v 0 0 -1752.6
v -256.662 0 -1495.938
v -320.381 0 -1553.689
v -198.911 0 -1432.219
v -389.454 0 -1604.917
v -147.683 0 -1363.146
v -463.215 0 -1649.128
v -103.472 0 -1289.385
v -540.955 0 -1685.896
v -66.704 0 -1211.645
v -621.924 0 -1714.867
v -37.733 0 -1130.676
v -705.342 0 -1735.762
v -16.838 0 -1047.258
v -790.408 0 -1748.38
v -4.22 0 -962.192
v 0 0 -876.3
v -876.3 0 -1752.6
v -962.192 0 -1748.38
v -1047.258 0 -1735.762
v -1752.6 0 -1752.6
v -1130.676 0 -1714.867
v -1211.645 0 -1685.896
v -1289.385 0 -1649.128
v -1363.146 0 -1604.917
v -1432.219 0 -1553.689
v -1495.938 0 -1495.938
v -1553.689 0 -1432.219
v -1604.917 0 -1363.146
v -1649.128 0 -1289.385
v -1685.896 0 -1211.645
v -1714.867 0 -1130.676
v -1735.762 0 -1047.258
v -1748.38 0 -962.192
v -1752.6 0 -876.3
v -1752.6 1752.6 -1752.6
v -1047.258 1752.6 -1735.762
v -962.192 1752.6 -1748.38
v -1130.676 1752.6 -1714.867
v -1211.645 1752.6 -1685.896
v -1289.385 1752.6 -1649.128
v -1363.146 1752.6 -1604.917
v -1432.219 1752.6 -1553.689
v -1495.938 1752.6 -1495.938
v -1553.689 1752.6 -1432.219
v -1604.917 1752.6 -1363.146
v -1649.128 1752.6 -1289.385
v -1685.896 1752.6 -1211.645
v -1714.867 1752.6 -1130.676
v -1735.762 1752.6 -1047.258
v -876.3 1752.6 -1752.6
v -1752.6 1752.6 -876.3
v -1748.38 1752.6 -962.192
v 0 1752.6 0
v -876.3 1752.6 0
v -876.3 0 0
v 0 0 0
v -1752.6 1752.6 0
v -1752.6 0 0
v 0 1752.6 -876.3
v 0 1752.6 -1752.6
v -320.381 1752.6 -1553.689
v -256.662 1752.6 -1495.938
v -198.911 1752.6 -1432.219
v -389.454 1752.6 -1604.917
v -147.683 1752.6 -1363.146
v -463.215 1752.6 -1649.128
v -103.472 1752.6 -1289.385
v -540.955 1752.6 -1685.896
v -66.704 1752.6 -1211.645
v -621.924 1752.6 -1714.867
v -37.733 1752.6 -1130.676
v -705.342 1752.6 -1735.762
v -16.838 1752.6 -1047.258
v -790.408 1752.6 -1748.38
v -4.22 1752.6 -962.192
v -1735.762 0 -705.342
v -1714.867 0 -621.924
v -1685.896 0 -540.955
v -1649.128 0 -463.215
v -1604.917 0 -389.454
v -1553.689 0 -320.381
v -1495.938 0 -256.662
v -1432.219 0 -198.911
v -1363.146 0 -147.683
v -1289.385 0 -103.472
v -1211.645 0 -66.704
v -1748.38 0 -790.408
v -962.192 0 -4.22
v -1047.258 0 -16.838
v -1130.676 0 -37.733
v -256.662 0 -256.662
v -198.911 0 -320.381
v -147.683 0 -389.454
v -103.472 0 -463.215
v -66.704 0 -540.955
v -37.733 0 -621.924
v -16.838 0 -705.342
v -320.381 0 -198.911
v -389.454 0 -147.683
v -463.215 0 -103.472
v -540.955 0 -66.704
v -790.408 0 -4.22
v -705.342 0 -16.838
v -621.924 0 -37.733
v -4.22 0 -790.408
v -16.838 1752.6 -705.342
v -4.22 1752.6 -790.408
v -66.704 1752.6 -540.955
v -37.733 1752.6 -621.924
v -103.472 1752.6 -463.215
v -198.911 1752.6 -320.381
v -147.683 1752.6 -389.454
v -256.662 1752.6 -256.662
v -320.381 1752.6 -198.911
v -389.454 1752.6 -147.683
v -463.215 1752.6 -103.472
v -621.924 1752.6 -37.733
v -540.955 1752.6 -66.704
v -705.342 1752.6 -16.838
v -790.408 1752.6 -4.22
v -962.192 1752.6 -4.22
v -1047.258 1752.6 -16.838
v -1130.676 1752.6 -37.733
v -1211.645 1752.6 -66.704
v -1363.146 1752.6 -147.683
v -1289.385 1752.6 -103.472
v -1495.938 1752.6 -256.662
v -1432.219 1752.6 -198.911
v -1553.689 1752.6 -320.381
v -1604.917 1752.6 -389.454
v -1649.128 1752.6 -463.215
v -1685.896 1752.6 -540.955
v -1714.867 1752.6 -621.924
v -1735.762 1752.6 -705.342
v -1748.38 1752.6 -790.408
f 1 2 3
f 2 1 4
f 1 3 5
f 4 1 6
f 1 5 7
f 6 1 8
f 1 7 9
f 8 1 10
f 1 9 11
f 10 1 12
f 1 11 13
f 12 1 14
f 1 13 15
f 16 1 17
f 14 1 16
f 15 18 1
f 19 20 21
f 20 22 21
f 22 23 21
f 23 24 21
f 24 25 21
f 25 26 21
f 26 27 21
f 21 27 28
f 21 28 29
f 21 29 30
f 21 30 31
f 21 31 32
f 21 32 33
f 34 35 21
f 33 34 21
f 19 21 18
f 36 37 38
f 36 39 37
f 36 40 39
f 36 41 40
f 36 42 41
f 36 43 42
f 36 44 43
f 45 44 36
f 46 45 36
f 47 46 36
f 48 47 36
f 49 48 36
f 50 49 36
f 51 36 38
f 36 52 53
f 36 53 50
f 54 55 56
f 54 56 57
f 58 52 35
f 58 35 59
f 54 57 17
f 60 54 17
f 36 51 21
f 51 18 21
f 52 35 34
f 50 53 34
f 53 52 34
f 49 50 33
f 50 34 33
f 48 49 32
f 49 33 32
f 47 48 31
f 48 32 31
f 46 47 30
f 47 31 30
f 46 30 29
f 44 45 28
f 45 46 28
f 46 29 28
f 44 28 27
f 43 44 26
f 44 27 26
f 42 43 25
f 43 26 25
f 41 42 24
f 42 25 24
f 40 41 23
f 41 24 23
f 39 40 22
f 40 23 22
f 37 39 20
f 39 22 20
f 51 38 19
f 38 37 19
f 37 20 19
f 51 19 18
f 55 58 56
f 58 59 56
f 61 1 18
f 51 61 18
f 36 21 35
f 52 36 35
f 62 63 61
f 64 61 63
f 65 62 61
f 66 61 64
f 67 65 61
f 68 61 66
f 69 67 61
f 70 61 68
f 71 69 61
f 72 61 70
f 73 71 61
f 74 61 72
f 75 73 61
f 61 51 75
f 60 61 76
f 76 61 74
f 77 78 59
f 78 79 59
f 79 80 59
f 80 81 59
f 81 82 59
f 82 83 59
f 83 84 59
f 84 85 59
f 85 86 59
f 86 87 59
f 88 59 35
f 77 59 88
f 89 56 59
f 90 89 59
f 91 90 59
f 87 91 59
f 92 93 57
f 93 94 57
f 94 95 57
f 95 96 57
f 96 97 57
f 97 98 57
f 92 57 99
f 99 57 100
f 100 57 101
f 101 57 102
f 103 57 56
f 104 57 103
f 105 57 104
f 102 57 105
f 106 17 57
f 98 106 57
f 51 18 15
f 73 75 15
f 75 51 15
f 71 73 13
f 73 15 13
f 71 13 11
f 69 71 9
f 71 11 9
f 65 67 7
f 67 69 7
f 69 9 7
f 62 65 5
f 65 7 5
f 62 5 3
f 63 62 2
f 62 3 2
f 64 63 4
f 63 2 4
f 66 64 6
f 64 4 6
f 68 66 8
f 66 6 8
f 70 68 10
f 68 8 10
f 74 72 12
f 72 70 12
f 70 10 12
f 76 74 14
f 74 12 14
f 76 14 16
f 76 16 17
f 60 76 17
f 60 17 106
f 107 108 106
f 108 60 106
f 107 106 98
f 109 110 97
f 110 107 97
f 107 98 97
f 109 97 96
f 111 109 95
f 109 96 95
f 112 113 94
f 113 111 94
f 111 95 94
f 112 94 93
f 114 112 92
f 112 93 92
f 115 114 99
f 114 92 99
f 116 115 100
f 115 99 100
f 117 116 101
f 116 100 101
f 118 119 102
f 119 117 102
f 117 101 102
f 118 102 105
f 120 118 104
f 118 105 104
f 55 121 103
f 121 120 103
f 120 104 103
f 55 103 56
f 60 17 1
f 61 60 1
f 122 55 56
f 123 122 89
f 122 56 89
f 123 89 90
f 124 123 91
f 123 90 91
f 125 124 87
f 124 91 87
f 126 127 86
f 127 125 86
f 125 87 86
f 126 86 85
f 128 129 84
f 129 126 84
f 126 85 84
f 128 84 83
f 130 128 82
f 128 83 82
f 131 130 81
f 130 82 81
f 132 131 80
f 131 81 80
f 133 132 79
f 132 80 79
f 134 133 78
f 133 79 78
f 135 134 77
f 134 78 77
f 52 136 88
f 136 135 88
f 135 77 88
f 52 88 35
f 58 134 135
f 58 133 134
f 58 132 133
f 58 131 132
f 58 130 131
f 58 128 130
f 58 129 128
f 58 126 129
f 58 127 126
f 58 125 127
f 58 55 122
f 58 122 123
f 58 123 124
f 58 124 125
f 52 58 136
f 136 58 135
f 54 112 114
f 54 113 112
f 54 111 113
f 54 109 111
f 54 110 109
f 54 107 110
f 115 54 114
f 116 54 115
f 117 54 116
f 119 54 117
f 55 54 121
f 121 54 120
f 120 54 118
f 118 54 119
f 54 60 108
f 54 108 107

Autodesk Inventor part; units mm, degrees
ref_plane "YZ Plane" through (0, 0, 0) normal (1, 0, 0) x (0, 1, 0)
ref_plane "XZ Plane" through (0, 0, 0) normal (0, 1, 0) x (-1, 0, 0)
ref_plane "XY Plane" through (0, 0, 0) normal (0, 0, 1) x (1, 0, 0)
sketch "Sketch1" plane through (0, 0, 0) normal (0, 1, 0) x (-1, 0, 0)
  line L0 (0, 0) -> (0, -1752.6)
  line L1 (0, -1752.6) -> (1752.6, -1752.6)
  line L2 (1752.6, -1752.6) -> (1752.6, 0)
  line L3 (1752.6, 0) -> (0, 0)
  circle A0 centre (876.3, -876.3) radius 876.3
  dimension "d0" = 1752.6
  dimension "d1" = 1752.6
extrude "Extrusion1" add sketch "Sketch1" along normal blind 1752.6 contours L3 A0 L0 | A0 L1 L0 | L3 L2 A0 | A0 L2 L1
properties part number "gdhole"
